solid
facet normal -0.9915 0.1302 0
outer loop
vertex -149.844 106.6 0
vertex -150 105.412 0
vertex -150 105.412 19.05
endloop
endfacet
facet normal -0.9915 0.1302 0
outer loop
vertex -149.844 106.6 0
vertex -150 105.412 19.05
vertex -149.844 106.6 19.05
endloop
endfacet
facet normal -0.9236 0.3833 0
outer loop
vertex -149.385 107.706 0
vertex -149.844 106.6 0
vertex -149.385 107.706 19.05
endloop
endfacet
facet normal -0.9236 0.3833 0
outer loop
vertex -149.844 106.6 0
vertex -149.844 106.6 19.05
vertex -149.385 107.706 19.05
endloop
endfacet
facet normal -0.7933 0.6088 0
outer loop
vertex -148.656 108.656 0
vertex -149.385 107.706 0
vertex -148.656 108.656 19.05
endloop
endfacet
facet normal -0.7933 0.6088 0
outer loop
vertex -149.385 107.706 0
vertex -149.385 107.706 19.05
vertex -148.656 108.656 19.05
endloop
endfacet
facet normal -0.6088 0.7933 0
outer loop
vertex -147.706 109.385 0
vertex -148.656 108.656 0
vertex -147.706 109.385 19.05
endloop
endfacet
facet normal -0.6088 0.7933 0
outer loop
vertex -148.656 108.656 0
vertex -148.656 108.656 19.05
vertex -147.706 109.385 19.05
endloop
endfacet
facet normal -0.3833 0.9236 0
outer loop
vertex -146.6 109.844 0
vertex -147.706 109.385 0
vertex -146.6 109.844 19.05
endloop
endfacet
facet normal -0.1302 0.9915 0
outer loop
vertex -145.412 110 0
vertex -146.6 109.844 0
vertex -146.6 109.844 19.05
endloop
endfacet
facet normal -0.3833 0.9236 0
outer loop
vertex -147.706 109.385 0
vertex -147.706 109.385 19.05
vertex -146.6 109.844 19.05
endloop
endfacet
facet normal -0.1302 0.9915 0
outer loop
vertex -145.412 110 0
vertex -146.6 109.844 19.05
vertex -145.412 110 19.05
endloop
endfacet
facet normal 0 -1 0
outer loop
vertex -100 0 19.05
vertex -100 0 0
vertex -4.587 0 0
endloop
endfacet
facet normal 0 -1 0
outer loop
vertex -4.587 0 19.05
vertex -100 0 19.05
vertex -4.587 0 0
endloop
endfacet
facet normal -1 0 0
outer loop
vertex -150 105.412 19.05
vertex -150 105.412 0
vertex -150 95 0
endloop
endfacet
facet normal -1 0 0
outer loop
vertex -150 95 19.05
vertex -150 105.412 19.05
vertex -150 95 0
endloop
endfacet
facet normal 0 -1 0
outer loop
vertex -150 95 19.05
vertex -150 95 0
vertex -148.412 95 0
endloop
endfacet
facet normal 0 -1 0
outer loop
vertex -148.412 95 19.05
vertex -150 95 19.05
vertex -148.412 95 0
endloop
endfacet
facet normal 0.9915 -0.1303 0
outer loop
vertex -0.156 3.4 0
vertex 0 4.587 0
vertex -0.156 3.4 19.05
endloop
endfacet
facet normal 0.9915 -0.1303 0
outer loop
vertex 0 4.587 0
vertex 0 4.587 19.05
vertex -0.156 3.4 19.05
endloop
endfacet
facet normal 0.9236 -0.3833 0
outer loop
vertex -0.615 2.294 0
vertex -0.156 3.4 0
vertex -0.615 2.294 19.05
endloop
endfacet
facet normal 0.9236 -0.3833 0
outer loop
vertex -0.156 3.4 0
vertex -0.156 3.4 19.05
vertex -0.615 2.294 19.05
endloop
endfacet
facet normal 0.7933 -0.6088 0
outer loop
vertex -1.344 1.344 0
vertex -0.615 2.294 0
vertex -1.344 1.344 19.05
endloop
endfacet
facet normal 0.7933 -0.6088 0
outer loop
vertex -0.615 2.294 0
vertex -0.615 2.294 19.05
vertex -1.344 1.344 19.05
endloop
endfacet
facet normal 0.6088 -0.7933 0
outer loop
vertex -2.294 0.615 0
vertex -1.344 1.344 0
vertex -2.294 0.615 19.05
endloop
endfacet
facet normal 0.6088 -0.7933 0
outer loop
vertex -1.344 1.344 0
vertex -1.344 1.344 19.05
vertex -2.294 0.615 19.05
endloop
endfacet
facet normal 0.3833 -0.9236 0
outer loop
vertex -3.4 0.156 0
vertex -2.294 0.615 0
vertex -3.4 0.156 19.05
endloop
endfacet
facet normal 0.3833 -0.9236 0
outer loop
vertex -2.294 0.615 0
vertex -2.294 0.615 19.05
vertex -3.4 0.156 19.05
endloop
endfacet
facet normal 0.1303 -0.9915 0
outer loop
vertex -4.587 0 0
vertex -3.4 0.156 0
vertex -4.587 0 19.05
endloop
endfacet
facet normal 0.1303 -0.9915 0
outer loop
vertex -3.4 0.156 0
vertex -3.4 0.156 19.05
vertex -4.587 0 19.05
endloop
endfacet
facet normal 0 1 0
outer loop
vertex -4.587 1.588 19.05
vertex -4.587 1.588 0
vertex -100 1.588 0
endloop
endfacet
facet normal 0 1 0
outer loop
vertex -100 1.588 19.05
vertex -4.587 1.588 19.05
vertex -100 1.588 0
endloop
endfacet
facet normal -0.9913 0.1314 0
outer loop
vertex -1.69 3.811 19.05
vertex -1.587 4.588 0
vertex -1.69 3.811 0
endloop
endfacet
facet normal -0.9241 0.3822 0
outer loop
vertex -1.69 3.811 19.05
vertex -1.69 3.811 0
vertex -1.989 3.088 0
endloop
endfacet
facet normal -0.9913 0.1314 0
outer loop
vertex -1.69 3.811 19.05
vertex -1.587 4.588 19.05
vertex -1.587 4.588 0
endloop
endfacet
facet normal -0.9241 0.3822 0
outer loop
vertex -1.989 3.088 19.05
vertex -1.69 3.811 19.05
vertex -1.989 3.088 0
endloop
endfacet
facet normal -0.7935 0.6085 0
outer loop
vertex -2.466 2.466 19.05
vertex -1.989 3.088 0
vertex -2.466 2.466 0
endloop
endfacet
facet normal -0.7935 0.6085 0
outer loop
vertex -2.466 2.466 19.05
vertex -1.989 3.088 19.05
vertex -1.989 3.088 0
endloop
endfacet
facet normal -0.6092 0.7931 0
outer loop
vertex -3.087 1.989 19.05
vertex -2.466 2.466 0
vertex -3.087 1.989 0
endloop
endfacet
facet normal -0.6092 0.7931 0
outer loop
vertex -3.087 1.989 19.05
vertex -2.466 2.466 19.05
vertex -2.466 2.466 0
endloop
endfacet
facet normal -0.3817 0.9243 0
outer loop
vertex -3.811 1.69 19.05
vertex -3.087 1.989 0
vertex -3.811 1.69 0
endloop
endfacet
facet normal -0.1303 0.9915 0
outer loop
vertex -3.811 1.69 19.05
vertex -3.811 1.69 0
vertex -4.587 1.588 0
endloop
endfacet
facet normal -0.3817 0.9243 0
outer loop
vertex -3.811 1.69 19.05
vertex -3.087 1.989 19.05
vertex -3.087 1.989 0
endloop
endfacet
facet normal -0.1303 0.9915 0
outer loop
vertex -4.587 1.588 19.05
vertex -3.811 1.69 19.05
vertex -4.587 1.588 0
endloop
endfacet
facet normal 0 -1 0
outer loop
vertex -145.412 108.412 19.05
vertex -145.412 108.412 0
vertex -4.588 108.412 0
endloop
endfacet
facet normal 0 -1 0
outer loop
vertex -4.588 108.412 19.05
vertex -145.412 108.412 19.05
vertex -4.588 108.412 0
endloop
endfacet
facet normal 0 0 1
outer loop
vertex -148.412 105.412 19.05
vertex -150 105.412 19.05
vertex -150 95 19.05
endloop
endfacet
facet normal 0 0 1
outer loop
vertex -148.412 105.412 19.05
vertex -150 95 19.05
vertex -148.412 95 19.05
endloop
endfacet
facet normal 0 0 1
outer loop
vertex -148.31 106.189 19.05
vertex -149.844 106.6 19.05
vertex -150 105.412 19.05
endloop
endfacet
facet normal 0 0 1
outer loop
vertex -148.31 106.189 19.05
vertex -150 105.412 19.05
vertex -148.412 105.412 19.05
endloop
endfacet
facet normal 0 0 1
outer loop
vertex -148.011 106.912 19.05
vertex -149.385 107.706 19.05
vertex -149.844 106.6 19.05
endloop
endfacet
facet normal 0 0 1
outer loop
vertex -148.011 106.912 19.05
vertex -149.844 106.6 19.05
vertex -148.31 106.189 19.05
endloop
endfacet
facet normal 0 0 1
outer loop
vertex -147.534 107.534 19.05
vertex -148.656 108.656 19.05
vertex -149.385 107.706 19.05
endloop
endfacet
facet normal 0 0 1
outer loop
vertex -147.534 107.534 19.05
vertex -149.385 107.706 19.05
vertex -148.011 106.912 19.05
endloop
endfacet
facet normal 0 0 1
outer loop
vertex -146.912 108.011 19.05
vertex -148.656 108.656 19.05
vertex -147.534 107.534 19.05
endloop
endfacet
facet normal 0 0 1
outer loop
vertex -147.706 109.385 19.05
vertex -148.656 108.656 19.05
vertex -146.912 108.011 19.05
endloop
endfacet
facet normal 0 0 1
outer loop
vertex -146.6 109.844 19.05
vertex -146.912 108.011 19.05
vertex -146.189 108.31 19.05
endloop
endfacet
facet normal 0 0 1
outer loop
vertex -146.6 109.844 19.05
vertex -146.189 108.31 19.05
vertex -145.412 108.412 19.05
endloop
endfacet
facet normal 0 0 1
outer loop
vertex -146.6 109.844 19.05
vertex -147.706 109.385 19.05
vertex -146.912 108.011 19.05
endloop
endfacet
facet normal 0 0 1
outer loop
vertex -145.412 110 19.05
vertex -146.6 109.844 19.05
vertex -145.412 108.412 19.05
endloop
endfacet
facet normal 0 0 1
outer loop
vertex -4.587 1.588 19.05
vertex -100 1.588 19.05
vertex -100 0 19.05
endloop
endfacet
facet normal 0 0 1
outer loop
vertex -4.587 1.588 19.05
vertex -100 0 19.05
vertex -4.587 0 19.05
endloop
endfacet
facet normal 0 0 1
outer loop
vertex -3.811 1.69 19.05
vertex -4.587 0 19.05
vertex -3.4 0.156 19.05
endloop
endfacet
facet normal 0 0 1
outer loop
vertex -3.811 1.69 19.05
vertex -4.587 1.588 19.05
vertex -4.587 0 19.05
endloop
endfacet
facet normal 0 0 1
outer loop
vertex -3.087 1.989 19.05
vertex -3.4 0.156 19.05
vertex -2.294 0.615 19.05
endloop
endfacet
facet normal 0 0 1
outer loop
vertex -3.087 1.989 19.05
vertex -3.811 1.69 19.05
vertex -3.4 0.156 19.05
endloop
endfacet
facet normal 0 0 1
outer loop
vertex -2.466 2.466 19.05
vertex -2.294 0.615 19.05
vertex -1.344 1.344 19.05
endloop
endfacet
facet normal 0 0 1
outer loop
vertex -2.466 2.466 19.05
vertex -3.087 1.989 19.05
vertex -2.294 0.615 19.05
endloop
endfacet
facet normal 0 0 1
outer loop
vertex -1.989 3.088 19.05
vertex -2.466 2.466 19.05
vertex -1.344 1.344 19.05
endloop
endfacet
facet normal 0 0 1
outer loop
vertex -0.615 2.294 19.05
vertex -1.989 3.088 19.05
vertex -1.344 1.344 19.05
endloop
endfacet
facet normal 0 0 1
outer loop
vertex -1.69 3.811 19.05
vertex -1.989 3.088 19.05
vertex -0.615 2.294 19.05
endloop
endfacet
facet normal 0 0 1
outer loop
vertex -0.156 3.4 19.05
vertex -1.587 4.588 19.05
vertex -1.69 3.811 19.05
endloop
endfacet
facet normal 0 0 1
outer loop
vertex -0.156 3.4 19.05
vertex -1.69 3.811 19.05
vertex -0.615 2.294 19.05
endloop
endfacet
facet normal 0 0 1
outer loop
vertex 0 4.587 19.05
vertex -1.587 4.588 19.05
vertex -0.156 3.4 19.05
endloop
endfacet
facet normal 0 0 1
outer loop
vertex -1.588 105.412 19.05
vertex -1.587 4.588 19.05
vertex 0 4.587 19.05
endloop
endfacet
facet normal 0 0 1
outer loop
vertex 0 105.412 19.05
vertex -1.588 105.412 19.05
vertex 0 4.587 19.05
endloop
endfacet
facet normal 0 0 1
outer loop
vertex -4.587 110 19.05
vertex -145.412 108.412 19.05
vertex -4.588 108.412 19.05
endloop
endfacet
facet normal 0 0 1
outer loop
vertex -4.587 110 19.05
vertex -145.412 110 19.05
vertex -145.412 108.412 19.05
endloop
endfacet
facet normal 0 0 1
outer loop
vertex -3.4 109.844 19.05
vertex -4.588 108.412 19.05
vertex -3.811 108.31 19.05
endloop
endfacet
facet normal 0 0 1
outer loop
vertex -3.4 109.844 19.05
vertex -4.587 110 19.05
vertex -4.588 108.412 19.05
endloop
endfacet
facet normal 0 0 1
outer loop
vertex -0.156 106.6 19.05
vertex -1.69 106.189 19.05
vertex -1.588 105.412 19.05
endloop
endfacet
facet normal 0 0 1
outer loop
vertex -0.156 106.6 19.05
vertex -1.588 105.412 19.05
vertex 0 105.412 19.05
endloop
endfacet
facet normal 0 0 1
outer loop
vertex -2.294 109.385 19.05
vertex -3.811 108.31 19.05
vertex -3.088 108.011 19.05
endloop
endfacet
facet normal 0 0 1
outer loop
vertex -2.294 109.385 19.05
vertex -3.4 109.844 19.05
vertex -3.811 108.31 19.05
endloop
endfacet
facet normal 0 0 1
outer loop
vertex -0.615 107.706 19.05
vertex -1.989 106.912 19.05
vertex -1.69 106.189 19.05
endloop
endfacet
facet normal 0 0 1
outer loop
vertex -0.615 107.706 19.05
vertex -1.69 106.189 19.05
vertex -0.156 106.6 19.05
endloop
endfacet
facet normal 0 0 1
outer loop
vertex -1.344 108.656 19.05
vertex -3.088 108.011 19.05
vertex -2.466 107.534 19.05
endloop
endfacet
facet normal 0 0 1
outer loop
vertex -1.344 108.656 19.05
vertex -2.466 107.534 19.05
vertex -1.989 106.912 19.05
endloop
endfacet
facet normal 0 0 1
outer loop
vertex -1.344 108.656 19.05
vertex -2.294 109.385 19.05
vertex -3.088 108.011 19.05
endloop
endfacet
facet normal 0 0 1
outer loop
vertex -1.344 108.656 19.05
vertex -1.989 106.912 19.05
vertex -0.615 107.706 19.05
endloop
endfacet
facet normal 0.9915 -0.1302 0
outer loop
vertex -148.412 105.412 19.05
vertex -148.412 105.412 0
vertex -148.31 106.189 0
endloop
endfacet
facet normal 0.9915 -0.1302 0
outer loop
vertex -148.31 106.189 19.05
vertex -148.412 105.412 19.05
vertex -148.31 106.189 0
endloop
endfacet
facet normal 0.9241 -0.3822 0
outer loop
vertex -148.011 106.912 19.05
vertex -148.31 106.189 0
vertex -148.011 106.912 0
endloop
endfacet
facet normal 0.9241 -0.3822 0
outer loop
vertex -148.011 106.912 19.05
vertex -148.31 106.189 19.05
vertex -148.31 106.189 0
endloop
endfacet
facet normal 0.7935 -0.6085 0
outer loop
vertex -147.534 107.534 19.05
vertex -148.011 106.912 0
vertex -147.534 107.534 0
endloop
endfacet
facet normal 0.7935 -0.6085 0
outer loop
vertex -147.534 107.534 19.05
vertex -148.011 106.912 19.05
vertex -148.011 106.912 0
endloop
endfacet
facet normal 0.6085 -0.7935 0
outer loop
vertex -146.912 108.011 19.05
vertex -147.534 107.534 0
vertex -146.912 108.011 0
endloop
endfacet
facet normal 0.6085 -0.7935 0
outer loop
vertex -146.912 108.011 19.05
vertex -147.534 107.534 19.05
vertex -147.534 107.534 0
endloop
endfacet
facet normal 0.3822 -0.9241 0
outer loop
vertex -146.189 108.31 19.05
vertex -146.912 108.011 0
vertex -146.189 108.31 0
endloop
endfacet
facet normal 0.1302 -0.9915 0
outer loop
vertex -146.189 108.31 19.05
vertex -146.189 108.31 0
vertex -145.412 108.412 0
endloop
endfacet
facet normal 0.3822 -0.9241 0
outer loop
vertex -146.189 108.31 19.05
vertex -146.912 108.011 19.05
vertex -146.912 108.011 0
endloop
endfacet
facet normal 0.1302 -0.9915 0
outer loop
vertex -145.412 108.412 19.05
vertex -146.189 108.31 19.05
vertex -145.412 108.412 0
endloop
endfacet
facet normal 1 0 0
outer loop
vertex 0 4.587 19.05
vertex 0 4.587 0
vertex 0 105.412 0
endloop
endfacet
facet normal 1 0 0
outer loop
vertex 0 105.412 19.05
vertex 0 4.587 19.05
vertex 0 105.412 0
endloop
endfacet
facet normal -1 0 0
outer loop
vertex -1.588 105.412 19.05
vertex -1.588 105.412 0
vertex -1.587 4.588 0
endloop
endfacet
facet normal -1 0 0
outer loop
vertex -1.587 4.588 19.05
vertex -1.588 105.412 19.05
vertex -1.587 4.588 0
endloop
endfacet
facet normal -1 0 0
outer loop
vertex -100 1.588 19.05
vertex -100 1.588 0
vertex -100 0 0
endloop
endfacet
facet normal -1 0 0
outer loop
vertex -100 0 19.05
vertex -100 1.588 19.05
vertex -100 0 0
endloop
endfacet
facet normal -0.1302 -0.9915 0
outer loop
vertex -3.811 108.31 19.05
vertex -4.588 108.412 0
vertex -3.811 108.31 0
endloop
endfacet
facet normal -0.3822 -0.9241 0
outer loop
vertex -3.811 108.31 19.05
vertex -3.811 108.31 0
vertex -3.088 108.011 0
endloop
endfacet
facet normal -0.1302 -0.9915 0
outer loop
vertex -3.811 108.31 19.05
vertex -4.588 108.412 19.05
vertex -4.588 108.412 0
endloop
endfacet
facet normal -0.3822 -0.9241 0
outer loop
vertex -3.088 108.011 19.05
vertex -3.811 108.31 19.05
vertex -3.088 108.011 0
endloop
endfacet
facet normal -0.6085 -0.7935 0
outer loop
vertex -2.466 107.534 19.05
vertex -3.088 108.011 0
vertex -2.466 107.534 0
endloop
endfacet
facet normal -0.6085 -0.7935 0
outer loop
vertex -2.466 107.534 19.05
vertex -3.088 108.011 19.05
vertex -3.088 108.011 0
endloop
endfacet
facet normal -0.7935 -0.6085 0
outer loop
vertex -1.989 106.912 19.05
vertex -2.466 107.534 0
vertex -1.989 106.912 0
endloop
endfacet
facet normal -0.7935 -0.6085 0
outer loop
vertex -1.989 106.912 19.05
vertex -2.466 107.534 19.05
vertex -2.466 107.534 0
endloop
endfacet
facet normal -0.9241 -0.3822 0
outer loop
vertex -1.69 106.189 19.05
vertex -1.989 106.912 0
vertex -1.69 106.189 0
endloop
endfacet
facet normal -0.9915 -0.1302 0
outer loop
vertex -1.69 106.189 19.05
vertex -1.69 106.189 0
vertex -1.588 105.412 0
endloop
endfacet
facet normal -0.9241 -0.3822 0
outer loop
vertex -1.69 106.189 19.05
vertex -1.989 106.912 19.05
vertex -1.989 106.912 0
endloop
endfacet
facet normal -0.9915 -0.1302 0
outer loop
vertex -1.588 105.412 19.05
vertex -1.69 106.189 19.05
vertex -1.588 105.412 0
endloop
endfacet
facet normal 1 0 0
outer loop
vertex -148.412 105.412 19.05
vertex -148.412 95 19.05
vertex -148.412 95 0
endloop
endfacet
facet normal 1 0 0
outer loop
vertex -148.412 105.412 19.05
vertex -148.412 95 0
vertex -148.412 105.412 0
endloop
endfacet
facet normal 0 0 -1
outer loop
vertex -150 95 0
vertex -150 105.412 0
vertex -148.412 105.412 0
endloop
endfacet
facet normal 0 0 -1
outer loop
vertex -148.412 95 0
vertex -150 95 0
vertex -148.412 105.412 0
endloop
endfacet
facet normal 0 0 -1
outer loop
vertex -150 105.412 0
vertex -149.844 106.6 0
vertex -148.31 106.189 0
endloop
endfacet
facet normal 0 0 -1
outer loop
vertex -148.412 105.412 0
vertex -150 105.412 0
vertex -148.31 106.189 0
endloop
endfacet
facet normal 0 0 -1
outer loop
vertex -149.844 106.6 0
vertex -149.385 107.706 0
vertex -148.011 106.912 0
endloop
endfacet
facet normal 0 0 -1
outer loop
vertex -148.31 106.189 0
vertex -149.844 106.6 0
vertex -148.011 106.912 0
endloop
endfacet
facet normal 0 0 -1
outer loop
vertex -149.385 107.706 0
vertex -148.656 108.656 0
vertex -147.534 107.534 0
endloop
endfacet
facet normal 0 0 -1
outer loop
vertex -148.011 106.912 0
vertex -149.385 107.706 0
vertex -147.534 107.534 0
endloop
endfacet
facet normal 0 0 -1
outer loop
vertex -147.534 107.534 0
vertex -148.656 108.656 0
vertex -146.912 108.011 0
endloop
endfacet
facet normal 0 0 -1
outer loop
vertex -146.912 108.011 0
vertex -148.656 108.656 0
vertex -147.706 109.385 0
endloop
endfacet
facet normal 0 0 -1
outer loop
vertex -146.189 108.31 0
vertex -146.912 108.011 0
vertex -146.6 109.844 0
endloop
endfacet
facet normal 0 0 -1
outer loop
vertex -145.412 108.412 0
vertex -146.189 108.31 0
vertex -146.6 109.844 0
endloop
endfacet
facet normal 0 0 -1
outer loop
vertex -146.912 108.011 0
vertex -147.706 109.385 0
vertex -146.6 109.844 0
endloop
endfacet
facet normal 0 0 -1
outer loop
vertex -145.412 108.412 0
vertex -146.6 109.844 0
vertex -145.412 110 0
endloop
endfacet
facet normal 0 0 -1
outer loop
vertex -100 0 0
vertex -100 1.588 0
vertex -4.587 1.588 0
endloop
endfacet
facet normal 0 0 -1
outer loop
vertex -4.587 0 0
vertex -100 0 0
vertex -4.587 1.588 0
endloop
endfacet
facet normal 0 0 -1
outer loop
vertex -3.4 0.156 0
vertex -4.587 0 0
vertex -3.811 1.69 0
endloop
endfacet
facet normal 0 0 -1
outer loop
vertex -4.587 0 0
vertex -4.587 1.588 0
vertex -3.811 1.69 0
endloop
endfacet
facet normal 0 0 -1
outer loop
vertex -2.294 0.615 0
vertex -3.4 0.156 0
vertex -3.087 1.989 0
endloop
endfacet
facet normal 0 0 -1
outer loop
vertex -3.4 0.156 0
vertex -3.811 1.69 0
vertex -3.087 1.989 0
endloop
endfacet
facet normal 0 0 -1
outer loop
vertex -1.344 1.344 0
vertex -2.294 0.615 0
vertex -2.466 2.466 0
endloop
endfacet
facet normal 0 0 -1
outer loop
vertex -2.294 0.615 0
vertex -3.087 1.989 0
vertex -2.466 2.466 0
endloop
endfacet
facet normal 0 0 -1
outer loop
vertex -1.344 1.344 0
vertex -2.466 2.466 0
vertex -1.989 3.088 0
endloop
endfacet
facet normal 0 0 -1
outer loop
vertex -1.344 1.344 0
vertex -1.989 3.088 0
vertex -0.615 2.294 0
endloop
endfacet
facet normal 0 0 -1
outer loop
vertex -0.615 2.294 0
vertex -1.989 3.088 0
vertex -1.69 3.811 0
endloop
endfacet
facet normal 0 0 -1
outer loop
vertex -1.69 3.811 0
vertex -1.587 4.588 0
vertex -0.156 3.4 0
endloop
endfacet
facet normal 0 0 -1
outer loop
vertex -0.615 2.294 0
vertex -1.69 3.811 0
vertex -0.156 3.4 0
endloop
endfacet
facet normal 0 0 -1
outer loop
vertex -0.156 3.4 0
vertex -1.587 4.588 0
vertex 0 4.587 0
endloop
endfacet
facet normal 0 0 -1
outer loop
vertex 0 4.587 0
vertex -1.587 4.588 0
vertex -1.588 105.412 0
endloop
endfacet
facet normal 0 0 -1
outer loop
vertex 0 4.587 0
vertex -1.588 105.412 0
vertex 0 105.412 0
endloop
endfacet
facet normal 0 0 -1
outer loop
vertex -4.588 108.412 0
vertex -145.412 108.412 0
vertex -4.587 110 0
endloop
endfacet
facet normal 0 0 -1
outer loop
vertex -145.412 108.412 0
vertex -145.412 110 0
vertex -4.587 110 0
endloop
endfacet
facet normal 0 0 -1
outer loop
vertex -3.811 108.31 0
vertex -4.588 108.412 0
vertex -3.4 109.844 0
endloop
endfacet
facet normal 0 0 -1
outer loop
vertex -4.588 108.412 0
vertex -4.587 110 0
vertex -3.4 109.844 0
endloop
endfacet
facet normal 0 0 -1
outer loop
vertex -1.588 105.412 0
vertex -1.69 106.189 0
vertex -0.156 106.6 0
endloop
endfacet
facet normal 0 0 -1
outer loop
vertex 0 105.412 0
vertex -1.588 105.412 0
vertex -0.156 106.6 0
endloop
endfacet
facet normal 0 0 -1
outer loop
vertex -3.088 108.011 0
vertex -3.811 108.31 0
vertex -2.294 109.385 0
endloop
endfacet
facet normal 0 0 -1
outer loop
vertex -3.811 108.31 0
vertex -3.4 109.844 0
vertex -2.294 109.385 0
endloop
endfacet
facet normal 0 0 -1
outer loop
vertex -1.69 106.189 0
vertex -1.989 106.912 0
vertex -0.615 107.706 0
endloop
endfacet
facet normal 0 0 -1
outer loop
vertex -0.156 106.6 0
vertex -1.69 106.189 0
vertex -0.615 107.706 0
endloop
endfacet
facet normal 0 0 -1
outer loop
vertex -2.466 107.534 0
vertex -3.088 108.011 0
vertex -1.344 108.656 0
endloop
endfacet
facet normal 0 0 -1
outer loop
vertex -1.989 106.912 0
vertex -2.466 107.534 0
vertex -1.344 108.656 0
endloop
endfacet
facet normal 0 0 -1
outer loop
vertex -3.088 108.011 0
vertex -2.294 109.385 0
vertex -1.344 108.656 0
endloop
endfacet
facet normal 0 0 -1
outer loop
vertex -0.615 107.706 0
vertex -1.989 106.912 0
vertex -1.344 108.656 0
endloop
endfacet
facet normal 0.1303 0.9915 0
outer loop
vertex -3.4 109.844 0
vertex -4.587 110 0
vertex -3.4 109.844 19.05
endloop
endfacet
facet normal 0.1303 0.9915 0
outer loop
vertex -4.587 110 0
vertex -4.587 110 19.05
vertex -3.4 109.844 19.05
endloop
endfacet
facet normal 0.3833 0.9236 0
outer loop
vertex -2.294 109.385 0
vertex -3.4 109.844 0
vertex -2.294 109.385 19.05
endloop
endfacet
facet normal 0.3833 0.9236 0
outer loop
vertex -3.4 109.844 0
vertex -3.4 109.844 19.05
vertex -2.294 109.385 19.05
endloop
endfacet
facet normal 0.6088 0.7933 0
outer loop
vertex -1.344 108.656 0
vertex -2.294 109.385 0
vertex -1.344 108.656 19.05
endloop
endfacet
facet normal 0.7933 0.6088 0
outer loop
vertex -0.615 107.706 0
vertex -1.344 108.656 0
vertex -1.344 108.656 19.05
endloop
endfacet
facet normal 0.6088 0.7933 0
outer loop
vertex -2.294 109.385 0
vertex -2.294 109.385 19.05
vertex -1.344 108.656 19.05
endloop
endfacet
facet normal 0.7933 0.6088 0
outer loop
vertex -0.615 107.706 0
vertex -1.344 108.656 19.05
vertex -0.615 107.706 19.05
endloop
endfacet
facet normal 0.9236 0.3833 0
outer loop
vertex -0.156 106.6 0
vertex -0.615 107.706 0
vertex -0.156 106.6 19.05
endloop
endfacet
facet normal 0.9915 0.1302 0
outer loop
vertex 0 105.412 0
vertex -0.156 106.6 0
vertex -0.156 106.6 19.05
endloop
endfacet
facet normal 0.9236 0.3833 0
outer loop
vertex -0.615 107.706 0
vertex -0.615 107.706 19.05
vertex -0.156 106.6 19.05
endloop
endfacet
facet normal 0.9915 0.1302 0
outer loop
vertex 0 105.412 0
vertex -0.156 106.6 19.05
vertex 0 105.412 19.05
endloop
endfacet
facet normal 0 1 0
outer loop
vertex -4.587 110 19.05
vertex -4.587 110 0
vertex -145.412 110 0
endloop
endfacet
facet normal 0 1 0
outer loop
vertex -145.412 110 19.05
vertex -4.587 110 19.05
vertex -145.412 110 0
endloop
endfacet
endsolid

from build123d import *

# Parameters (mm, degrees)
BOSS_EXTRUDE1_DEPTH = 19.05
FILLET1_R           = 3
FILLET2_R           = 4.5875


with BuildPart() as part:
    # Sketch1 → Boss-Extrude1 (new body)
    with BuildSketch(Plane.XY):
        Polygon((-100, 0), (0, 0), (0, 110), (-150, 110), (-150, 95), (-148.4125, 95), (-148.4125, 108.4125), (-1.5875, 108.4125), (-1.5875, 1.5875), (-100, 1.5875), align=None)
    extrude(amount=BOSS_EXTRUDE1_DEPTH)

    # Fillet1
    fillet1_edges = [part.edges().sort_by_distance(p)[0] for p in [
        (-1.5875, 1.5875, 9.525),
        (-1.5875, 108.4125, 9.525),
        (-148.4125, 108.4125, 9.525),
    ]]
    fillet(fillet1_edges, radius=FILLET1_R)

    # Fillet2
    fillet2_edges = [part.edges().sort_by_distance(p)[0] for p in [
        (-150, 110, 9.525),
        (0, 110, 9.525),
        (0, 0, 9.525),
    ]]
    fillet(fillet2_edges, radius=FILLET2_R)


solid = part.part
